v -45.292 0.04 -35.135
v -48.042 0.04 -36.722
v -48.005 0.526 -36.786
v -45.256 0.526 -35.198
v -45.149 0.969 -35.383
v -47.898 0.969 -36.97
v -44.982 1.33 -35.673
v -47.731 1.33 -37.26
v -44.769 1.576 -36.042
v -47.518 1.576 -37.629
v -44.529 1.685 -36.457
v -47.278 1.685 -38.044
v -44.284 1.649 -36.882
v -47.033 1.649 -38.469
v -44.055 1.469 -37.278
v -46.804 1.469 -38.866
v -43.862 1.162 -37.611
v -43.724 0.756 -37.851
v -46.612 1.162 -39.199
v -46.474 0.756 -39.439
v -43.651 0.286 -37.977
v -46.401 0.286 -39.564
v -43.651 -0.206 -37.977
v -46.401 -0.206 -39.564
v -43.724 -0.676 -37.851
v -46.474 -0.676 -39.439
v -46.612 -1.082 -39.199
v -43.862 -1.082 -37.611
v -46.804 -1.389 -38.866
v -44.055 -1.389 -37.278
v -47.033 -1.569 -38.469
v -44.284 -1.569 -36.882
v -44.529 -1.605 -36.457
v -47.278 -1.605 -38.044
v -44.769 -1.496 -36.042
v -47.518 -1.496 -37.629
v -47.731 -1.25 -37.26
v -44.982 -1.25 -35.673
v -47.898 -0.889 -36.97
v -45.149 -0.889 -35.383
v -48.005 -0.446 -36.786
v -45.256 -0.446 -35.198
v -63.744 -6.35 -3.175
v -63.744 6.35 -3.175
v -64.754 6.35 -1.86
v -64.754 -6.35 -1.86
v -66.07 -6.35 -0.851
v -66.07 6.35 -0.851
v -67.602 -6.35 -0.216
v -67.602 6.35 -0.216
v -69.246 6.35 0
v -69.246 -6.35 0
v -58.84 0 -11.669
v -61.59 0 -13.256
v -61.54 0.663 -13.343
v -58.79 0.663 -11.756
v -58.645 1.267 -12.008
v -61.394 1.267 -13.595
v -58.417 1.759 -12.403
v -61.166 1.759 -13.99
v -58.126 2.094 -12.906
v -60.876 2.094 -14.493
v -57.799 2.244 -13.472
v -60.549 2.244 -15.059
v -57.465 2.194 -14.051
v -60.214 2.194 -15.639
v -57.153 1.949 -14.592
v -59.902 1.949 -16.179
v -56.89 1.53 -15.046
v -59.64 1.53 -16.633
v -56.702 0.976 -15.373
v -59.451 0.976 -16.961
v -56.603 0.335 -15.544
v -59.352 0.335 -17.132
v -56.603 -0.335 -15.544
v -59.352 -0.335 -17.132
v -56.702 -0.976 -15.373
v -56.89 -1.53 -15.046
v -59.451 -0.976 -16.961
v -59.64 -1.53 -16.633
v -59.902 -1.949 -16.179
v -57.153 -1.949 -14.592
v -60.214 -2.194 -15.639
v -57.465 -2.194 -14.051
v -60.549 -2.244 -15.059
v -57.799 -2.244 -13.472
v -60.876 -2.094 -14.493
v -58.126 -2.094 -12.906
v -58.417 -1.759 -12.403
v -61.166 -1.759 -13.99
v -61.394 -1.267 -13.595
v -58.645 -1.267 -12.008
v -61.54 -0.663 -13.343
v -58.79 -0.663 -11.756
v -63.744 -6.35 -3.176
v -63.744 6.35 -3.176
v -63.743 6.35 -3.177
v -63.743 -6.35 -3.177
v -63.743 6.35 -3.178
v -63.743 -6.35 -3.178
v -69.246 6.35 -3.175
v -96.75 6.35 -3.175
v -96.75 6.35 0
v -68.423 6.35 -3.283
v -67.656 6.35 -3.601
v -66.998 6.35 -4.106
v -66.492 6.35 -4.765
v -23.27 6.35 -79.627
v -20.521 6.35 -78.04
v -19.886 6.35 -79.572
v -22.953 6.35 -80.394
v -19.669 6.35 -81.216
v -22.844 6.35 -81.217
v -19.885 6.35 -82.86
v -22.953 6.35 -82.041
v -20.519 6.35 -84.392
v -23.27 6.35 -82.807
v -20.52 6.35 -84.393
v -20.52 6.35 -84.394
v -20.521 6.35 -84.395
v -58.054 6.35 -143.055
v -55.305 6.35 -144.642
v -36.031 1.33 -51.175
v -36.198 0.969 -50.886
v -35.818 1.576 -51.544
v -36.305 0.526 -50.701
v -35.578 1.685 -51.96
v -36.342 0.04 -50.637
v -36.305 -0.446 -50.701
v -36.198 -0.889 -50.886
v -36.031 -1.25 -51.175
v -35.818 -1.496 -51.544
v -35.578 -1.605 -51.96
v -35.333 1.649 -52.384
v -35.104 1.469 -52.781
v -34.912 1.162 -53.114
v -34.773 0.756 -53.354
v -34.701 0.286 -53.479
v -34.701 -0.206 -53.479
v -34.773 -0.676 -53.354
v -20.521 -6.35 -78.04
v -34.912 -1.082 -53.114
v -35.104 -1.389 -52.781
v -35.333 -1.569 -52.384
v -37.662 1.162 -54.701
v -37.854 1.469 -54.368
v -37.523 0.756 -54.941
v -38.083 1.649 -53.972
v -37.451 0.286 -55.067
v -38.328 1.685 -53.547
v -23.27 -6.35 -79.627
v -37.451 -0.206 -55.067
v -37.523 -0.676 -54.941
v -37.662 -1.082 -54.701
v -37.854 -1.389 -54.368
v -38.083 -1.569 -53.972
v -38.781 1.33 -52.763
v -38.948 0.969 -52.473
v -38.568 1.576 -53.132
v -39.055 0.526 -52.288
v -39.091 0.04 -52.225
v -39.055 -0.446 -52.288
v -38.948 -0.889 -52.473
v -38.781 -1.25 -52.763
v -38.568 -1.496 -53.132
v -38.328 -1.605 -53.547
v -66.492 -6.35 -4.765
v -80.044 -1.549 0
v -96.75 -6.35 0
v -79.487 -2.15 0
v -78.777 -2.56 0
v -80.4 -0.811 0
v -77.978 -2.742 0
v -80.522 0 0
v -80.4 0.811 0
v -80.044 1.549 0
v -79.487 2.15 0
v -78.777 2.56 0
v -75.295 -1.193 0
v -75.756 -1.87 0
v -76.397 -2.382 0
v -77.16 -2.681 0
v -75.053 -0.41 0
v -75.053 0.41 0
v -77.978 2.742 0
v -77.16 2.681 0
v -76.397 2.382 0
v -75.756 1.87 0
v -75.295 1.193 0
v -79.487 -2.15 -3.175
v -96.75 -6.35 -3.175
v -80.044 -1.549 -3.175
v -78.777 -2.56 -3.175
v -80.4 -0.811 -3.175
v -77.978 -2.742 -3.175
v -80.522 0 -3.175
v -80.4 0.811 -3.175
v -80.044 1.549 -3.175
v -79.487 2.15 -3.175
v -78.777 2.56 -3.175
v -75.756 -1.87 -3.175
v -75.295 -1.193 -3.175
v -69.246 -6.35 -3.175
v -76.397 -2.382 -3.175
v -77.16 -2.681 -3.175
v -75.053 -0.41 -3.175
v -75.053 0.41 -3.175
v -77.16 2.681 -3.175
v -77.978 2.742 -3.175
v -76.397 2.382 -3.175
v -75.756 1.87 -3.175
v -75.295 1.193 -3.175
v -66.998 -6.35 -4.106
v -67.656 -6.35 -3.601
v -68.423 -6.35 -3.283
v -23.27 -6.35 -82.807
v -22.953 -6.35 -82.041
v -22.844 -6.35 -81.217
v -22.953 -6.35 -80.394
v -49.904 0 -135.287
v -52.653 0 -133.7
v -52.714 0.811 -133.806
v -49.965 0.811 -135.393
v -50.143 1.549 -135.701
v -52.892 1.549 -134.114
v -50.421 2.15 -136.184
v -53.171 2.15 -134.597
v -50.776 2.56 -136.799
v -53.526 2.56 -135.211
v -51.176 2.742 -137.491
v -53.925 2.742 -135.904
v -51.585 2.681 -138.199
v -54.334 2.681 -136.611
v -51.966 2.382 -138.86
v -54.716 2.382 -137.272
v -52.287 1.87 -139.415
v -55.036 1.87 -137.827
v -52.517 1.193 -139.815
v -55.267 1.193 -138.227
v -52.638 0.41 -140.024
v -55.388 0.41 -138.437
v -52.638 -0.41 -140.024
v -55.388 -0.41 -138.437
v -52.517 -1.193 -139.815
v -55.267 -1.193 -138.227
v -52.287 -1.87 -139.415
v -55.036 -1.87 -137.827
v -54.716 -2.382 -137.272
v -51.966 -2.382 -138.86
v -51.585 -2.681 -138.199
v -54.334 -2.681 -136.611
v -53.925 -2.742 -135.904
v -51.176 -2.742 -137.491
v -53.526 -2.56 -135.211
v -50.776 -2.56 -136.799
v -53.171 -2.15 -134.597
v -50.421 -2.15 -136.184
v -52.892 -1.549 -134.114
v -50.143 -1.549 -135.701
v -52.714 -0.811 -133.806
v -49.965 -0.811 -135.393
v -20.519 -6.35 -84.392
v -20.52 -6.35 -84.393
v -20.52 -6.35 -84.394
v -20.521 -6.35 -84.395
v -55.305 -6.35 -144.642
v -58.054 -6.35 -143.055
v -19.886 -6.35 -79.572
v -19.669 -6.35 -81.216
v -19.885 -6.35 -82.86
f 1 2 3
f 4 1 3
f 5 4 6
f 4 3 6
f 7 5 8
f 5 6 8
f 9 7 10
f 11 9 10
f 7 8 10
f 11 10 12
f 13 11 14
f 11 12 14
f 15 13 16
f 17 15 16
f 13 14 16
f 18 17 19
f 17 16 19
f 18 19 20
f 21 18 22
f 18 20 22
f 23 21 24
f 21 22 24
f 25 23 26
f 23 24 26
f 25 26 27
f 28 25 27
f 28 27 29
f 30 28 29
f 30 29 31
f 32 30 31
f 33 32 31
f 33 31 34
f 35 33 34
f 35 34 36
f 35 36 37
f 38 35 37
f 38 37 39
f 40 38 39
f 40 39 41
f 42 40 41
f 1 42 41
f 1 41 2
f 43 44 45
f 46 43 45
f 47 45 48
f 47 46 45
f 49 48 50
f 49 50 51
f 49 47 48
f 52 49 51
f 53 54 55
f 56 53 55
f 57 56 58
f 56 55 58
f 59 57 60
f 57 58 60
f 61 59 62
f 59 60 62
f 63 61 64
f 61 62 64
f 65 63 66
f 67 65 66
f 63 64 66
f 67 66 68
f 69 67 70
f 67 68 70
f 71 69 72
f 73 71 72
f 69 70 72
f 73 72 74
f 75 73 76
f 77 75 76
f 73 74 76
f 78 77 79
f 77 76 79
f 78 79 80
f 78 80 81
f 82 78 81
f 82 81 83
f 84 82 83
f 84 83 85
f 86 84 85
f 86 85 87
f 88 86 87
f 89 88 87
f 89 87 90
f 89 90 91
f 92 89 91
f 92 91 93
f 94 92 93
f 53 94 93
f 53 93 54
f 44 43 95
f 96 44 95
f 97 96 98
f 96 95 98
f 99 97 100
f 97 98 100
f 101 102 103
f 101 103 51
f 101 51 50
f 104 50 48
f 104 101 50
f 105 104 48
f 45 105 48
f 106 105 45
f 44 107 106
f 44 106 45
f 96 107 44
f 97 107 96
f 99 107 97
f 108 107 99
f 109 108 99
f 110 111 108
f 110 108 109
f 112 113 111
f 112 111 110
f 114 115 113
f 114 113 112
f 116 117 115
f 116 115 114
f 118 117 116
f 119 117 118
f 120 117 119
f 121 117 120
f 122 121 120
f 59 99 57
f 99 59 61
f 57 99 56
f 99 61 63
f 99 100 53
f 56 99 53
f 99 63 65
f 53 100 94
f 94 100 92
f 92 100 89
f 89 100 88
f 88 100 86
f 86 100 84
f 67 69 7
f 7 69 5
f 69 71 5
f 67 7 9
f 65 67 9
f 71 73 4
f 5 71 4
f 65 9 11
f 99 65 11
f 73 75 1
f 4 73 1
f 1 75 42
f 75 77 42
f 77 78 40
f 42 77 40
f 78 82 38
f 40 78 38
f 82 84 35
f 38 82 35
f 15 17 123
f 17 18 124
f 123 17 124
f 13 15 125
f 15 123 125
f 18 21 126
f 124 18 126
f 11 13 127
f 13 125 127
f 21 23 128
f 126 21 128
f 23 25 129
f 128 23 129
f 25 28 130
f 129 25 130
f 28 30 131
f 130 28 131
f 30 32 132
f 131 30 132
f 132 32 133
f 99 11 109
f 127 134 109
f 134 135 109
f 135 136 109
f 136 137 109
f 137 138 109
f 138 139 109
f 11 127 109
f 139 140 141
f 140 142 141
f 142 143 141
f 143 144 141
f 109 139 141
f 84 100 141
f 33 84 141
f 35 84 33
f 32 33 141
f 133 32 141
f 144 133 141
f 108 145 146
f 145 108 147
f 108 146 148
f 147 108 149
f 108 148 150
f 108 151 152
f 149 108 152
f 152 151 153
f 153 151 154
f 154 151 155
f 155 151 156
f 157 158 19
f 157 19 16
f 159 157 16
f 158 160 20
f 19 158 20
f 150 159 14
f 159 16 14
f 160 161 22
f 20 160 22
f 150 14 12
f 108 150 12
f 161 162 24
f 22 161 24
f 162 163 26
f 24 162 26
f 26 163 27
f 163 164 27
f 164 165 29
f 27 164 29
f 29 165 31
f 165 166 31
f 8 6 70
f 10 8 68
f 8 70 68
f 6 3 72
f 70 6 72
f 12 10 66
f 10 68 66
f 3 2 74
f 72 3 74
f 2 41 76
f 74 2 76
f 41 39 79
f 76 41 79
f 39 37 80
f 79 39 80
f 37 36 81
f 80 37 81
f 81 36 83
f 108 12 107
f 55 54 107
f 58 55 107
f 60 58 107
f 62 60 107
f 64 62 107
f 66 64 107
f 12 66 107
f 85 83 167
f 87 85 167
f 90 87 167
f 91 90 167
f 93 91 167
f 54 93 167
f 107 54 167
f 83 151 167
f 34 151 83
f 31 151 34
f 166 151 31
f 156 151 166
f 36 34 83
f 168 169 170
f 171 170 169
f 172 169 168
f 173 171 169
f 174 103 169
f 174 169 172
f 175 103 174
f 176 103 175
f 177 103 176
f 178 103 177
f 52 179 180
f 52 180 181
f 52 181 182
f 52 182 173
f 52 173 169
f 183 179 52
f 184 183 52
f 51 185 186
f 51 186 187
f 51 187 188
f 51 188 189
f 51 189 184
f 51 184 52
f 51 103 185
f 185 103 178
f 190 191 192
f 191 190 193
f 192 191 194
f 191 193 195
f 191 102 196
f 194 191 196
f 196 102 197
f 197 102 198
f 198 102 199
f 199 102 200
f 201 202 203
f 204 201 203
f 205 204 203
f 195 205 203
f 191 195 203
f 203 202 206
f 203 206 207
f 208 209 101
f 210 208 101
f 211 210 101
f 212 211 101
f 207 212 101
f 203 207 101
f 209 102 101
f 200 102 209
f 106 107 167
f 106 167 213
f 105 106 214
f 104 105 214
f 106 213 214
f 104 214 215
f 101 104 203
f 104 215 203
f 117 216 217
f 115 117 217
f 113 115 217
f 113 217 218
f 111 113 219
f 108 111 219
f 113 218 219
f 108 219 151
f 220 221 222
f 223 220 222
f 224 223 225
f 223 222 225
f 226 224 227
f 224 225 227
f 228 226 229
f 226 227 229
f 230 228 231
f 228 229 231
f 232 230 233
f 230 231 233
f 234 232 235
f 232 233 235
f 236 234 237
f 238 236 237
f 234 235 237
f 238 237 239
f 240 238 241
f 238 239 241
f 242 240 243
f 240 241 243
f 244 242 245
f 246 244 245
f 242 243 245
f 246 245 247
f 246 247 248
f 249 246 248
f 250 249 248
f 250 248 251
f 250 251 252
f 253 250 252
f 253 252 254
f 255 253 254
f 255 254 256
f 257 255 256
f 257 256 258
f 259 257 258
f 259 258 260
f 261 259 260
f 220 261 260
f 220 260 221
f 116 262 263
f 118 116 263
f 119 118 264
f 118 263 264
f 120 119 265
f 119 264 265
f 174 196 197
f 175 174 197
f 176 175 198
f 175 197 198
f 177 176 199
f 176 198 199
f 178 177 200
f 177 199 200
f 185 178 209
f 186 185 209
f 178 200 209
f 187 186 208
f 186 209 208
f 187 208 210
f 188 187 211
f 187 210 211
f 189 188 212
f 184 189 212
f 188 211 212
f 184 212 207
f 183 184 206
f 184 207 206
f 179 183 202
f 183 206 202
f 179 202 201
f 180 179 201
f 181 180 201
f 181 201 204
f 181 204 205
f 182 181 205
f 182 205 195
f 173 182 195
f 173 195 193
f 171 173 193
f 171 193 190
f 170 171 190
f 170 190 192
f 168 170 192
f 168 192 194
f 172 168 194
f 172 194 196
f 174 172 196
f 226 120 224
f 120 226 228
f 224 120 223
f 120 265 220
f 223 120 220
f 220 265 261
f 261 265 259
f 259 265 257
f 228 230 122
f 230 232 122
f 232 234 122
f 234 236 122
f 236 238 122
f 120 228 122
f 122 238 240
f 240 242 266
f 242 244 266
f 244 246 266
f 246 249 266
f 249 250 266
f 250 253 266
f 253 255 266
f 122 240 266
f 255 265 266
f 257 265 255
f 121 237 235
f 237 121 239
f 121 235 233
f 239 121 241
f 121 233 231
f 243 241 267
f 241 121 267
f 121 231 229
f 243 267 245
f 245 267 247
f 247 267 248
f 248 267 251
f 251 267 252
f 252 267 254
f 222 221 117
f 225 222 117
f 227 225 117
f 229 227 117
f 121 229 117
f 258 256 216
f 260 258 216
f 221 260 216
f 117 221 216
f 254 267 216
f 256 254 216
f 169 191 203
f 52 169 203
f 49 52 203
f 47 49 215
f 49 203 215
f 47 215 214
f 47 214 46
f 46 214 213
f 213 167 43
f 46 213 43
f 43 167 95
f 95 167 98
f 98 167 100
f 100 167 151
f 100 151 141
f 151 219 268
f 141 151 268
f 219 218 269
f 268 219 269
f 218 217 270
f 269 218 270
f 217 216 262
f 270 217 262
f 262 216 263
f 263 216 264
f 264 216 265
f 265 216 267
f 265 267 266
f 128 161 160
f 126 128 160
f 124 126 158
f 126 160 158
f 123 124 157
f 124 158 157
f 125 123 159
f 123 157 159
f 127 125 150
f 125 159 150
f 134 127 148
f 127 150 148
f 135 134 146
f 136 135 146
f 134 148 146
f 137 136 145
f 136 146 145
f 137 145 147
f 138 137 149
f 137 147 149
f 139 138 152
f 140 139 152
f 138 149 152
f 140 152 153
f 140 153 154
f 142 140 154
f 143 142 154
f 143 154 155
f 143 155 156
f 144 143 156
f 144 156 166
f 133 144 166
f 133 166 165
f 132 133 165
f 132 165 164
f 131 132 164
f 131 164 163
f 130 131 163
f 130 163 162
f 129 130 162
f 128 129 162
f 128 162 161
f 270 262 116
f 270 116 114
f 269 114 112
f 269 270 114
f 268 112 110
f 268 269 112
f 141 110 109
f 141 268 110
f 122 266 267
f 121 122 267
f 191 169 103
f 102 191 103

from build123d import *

# Parameters (mm, degrees)
ESBO_O2_W               = 193.5
ESBO_O2_H               = 12.7
FLANGE_BASE1_DEPTH      = 3.175
DOBRA_START             = -6.35
DOBRA_ESBO_ADA1_DEPTH   = 12.7
DOBRA_ESBO_ADA1_2_DEPTH = 12.7
DOBRA_ESBO_ADA2_DEPTH   = 12.7
DOBRA_ESBO_ADA2_2_DEPTH = 12.7
ESBO_O10_R              = 2.75
CORTE_EXTRUS_O2_DEPTH   = 10
ESBO_O11_R              = 2.75
CORTE_EXTRUS_O3_DEPTH   = 10
ESBO_O12_R              = 1.65
ESBO_O12_R_2            = 2.250000002
CORTE_EXTRUS_O4_DEPTH   = 10


# Read off the part's stored shape, not the designer's step: Dobra esboçada1, Dobra esboçada2
# Sheet-metal steps are written as plain solids
with BuildPart() as part:
    # Esboço2 → Flange-base1 (new body)
    with BuildSketch(Plane.XY):
        Rectangle(ESBO_O2_W, ESBO_O2_H)
    extrude(amount=-FLANGE_BASE1_DEPTH)

    # Dobra esboçada1 outline → Dobra esboçada1 (cut)
    with BuildSketch(Plane(origin=(0, 0, 0), x_dir=(1, 0, 0), z_dir=(0, 1, 0)).offset(DOBRA_START)):
        with BuildLine():
            Line((96.75, 3.175), (-63.744109855, 3.175))
            ThreePointArc((-63.744109855, 3.175), (-66.070007409, 0.850686918), (-69.246257163, 0))
            Line((-69.246257163, 0), (96.75, 0))
            Line((96.75, 0), (96.75, 3.175))
        make_face()
    extrude(amount=DOBRA_ESBO_ADA1_DEPTH, mode=Mode.SUBTRACT)

    # Dobra esbo_ada1 2 outline → Dobra esbo_ada1 2 (add)
    with BuildSketch(Plane(origin=(0, 0, 0), x_dir=(1, 0, 0), z_dir=(0, 1, 0)).offset(DOBRA_START)):
        with BuildLine():
            Line((16.759205697, 142.610831402), (14.00957504, 144.198331402))
            Line((14.00957504, 144.198331402), (-66.492296379, 4.765))
            ThreePointArc((-66.492296379, 4.765), (-67.656257163, 3.601039216), (-69.246257163, 3.175))
            Line((-69.246257163, 3.175), (-63.744109855, 3.175))
            ThreePointArc((-63.744109855, 3.175), (-63.743387647, 3.176249918), (-63.742665722, 3.1775))
            Line((-63.742665722, 3.1775), (16.759205697, 142.610831402))
        make_face()
    extrude(amount=DOBRA_ESBO_ADA1_2_DEPTH)

    # Dobra esboçada2 outline → Dobra esboçada2 (cut)
    with BuildSketch(Plane(origin=(0, 0, 0), x_dir=(1, 0, 0), z_dir=(0, 1, 0)).offset(DOBRA_START)):
        with BuildLine():
            Line((14.00957504, 144.198331402), (-20.519351306, 84.39247664))
            ThreePointArc((-20.519351306, 84.39247664), (-19.669385908, 81.21603373), (-20.520794303, 78.039977295))
            Line((-20.520794303, 78.039977295), (16.759205697, 142.610831402))
            Line((16.759205697, 142.610831402), (14.00957504, 144.198331402))
        make_face()
    extrude(amount=DOBRA_ESBO_ADA2_DEPTH, mode=Mode.SUBTRACT)

    # Dobra esbo_ada2 2 outline → Dobra esbo_ada2 2 (add)
    with BuildSketch(Plane(origin=(0, 0, 0), x_dir=(1, 0, 0), z_dir=(0, 1, 0)).offset(DOBRA_START)):
        with BuildLine():
            Line((-58.054167797, 143.054687167), (-23.27042496, 82.807477295))
            ThreePointArc((-23.27042496, 82.807477295), (-22.844385744, 81.217477295), (-23.27042496, 79.627477295))
            Line((-23.27042496, 79.627477295), (-20.519351306, 84.39247664))
            ThreePointArc((-20.519351306, 84.39247664), (-20.520072663, 84.393727049), (-20.520794303, 84.394977295))
            Line((-20.520794303, 84.394977295), (-55.30453714, 144.642187167))
            Line((-55.30453714, 144.642187167), (-58.054167797, 143.054687167))
        make_face()
    extrude(amount=DOBRA_ESBO_ADA2_2_DEPTH)

    # Esboço10 → Corte-extrusão2 (cut)
    with BuildSketch(Plane(origin=(18.403870761, 0, -10.625479738), x_dir=(0.5000000000000041, 0, 0.8660254037844364), z_dir=(-0.8660254037844363, 0, 0.500000000000004))):
        with Locations((-144.864192108, 0)):
            Circle(ESBO_O10_R)
    extrude(amount=-CORTE_EXTRUS_O2_DEPTH, mode=Mode.SUBTRACT)

    # Esboço11 → Corte-extrusão3 (cut)
    with BuildSketch(Plane(origin=(0, 0, -3.175), x_dir=(-1, 0, 0), z_dir=(0, 0, -1))):
        with Locations((77.77220064, 0)):
            Circle(ESBO_O11_R)
    extrude(amount=-CORTE_EXTRUS_O3_DEPTH, mode=Mode.SUBTRACT)

    # Esboço12 → Corte-extrusão4 (cut)
    with BuildSketch(Plane(origin=(-51.932527808, 0, -29.98325891), x_dir=(-0.49999999999999806, 0, 0.8660254037844398), z_dir=(-0.8660254037844397, 0, -0.499999999999998))):
        with Locations((-27.332391374, 0.04)):
            Circle(ESBO_O12_R)
        with Locations((17.064458437, 0)):
            Circle(ESBO_O12_R_2)
        with Locations((-9.431391374, 0.04)):
            Circle(ESBO_O12_R)
    extrude(amount=-CORTE_EXTRUS_O4_DEPTH, mode=Mode.SUBTRACT)


solid = part.part
